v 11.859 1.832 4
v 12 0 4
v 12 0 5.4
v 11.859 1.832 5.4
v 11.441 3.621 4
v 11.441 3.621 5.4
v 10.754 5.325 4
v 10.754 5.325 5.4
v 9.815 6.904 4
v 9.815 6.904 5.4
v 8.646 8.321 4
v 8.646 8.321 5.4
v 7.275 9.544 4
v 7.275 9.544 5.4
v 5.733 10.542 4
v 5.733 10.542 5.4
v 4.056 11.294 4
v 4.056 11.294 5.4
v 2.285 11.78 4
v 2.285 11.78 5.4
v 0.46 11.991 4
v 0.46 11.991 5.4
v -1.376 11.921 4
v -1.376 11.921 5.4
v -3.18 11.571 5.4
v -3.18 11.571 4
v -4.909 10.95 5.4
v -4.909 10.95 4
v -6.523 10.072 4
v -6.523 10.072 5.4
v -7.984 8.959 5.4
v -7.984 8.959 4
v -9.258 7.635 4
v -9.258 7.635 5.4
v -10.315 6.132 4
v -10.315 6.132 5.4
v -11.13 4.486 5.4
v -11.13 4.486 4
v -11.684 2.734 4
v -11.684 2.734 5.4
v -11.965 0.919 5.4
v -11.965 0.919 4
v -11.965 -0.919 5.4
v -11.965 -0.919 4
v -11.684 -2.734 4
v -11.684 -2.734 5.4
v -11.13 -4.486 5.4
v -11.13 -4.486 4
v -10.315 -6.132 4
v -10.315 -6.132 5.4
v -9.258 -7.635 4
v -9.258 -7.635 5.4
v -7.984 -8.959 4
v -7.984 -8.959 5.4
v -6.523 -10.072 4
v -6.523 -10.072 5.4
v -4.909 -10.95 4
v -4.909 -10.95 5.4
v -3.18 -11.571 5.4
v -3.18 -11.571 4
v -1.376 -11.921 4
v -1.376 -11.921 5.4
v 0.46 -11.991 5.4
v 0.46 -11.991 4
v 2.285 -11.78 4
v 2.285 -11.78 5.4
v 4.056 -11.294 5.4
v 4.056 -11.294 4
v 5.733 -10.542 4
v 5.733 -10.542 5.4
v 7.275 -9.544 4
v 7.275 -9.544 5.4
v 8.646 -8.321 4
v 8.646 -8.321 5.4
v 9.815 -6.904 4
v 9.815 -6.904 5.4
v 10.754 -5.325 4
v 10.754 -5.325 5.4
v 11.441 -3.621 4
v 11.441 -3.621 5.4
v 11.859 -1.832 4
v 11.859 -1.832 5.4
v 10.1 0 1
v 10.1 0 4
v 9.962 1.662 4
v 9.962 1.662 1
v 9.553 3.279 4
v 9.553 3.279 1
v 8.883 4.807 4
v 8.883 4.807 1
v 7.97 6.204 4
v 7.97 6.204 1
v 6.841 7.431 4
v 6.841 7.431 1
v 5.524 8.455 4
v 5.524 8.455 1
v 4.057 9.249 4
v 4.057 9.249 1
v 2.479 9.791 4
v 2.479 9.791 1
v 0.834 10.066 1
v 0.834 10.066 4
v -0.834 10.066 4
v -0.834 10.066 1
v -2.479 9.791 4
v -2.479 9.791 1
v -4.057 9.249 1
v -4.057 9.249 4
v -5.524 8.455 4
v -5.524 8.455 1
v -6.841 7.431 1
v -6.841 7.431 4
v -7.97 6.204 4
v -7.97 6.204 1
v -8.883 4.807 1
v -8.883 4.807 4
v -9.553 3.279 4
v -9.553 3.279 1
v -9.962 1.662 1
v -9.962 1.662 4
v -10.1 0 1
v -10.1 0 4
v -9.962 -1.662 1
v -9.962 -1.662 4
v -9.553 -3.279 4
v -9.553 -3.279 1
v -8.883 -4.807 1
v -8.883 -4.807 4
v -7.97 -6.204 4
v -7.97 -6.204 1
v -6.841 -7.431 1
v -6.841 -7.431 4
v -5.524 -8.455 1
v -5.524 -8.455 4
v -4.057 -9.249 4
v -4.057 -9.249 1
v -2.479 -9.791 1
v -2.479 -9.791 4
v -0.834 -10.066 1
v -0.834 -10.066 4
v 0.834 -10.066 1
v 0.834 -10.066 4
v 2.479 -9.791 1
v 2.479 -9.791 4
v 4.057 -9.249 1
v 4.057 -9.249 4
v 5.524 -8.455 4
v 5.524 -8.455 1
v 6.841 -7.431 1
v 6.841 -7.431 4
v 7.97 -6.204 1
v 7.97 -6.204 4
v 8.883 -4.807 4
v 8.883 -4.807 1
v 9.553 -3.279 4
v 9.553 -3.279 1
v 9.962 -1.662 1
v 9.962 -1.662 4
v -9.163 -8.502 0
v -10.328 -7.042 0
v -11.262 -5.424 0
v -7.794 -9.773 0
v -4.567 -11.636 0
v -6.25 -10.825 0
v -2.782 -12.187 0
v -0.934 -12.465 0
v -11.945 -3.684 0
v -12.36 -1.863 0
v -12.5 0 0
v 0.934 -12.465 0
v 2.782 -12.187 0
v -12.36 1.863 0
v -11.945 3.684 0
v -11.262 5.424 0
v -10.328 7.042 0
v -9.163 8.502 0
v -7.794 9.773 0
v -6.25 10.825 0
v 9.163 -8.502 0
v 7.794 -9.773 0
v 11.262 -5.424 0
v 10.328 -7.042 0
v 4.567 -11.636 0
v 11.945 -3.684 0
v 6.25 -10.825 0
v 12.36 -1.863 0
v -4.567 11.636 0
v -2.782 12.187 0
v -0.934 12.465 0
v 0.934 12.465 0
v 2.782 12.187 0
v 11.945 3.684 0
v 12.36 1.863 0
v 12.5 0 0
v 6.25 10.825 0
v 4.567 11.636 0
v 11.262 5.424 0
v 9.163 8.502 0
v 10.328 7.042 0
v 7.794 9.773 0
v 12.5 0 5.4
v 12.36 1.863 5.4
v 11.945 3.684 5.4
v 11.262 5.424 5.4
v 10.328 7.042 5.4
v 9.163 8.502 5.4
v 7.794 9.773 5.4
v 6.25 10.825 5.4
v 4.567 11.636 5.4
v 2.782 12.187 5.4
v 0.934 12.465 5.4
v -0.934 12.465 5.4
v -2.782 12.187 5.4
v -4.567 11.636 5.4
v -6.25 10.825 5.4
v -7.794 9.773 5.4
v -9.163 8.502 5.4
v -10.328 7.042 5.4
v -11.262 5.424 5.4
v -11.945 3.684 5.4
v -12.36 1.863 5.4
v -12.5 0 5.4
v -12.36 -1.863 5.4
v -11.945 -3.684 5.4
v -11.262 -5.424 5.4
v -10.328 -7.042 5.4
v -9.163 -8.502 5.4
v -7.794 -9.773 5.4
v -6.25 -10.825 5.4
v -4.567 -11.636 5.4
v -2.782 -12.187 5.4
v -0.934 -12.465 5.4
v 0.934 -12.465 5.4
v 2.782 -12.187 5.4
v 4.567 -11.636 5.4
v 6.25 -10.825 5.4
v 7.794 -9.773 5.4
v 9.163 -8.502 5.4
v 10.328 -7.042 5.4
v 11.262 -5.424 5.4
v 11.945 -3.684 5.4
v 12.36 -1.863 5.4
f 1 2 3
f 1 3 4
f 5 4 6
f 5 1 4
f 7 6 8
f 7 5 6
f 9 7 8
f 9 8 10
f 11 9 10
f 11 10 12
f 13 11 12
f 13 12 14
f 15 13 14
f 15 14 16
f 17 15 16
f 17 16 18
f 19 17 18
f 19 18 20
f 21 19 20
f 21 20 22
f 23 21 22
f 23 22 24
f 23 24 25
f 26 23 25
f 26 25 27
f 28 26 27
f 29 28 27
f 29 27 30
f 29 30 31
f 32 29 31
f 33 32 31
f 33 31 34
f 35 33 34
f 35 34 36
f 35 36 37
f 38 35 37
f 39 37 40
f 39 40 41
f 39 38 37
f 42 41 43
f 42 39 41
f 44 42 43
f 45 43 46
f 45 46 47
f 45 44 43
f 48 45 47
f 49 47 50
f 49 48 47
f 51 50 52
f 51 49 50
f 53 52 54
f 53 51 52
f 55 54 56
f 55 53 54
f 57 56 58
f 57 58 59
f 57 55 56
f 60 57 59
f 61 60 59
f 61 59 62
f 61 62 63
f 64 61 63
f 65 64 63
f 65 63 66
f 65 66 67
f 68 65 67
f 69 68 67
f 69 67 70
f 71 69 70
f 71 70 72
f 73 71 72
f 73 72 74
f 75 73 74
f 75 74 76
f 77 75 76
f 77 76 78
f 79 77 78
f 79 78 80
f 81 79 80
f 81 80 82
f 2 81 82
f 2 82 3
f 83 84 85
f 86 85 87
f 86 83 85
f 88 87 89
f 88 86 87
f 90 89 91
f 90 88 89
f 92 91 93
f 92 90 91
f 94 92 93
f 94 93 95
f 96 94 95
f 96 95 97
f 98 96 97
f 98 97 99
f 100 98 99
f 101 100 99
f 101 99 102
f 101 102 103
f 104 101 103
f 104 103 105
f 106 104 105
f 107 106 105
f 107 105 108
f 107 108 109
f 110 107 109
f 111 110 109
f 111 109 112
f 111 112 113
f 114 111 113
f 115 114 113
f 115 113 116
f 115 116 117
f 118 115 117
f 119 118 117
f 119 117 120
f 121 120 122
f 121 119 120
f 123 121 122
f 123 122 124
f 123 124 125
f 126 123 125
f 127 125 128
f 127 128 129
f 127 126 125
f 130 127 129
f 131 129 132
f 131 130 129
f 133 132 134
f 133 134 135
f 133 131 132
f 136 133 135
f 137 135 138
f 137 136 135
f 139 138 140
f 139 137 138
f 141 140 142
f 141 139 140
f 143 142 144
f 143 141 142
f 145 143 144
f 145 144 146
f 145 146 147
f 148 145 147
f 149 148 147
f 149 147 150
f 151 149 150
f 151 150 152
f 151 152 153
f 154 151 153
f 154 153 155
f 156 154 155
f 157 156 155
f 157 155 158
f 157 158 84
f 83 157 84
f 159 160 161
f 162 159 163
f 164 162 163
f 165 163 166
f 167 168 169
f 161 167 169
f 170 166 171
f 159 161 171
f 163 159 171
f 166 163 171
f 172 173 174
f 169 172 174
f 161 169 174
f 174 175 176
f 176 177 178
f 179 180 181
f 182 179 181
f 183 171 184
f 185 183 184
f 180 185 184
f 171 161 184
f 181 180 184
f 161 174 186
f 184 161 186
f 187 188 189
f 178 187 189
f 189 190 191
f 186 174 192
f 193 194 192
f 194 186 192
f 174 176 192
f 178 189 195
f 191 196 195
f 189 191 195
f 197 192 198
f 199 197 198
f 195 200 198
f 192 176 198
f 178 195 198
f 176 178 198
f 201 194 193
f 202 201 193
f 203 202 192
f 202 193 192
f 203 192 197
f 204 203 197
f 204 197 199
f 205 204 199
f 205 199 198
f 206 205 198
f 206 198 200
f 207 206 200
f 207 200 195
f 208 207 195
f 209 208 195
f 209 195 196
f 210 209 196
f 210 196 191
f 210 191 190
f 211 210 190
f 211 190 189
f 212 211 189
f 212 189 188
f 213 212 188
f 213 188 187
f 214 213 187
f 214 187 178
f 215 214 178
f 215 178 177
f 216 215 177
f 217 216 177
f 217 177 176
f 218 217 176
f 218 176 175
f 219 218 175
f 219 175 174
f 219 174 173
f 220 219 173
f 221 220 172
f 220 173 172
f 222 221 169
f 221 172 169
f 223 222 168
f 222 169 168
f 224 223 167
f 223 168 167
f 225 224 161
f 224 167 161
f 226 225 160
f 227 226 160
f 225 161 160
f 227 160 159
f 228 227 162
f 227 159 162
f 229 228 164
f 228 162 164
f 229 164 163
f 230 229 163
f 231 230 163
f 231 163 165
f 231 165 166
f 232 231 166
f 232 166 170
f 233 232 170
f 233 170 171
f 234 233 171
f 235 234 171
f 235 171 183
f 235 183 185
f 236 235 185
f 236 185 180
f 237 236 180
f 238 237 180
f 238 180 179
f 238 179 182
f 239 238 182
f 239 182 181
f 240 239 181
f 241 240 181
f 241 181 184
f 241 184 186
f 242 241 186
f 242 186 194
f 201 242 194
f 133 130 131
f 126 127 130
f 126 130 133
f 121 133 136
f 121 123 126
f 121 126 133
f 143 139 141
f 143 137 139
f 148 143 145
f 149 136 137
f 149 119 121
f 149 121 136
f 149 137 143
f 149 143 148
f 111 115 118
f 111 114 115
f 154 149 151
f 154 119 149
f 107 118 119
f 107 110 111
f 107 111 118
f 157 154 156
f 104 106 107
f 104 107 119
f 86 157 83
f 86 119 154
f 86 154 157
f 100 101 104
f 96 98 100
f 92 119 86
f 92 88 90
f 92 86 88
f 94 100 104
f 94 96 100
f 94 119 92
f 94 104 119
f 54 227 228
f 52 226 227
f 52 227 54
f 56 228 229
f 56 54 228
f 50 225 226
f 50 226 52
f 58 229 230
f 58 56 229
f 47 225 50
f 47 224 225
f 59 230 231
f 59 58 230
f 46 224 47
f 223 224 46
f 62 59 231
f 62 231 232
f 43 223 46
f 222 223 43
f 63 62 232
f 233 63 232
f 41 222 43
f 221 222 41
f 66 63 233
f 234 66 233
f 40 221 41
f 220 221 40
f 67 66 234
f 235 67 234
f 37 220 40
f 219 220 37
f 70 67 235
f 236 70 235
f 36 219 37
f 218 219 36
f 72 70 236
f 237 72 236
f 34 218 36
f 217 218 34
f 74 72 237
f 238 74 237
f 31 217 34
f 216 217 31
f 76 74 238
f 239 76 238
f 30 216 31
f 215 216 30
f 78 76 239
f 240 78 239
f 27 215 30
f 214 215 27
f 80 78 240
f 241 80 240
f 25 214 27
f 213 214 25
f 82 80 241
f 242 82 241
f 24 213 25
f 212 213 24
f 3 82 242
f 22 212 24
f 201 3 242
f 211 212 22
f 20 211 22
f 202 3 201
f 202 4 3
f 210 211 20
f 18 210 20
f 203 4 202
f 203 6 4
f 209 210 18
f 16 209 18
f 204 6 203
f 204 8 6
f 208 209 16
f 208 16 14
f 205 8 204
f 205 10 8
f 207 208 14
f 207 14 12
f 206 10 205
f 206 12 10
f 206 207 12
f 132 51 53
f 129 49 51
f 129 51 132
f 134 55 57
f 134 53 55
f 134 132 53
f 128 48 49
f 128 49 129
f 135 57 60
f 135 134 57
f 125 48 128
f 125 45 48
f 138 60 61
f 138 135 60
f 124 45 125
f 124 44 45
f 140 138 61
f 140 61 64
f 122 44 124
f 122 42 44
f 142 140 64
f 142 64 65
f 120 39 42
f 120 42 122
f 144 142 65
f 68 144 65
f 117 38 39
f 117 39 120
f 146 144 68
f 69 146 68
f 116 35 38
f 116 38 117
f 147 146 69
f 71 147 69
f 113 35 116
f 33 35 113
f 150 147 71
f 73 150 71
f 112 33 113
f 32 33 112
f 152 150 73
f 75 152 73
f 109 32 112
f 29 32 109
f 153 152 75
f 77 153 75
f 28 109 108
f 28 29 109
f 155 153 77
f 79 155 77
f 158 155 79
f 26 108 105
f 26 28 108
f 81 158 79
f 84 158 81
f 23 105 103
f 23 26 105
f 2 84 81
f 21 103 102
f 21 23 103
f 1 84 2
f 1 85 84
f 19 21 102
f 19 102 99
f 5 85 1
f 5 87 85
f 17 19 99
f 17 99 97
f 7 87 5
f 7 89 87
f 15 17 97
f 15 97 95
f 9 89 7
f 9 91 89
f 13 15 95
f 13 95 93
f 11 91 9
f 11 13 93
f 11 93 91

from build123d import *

# Parameters (mm, degrees)
F0_R     = 12.5
F0_R_2   = 12
F1_DEPTH = 5.4
F2_R     = 12.5
F3_DEPTH = 1
F4_R     = 12.5
F4_R_2   = 10.1
F5_DEPTH = 4


with BuildPart() as f1:
    # F0 (on Top) → F1 (new body)
    with BuildSketch(Plane.XY):
        Circle(F0_R)
        Circle(F0_R_2, mode=Mode.SUBTRACT)
    extrude(amount=F1_DEPTH)

    # F2 (on Top) → F3 (join)
    with BuildSketch(Plane.XY):
        Circle(F2_R)
    extrude(amount=F3_DEPTH)

    # F4 (on Top) → F5 (join)
    with BuildSketch(Plane.XY):
        Circle(F4_R)
        Circle(F4_R_2, mode=Mode.SUBTRACT)
    extrude(amount=F5_DEPTH)


solid = f1.part
